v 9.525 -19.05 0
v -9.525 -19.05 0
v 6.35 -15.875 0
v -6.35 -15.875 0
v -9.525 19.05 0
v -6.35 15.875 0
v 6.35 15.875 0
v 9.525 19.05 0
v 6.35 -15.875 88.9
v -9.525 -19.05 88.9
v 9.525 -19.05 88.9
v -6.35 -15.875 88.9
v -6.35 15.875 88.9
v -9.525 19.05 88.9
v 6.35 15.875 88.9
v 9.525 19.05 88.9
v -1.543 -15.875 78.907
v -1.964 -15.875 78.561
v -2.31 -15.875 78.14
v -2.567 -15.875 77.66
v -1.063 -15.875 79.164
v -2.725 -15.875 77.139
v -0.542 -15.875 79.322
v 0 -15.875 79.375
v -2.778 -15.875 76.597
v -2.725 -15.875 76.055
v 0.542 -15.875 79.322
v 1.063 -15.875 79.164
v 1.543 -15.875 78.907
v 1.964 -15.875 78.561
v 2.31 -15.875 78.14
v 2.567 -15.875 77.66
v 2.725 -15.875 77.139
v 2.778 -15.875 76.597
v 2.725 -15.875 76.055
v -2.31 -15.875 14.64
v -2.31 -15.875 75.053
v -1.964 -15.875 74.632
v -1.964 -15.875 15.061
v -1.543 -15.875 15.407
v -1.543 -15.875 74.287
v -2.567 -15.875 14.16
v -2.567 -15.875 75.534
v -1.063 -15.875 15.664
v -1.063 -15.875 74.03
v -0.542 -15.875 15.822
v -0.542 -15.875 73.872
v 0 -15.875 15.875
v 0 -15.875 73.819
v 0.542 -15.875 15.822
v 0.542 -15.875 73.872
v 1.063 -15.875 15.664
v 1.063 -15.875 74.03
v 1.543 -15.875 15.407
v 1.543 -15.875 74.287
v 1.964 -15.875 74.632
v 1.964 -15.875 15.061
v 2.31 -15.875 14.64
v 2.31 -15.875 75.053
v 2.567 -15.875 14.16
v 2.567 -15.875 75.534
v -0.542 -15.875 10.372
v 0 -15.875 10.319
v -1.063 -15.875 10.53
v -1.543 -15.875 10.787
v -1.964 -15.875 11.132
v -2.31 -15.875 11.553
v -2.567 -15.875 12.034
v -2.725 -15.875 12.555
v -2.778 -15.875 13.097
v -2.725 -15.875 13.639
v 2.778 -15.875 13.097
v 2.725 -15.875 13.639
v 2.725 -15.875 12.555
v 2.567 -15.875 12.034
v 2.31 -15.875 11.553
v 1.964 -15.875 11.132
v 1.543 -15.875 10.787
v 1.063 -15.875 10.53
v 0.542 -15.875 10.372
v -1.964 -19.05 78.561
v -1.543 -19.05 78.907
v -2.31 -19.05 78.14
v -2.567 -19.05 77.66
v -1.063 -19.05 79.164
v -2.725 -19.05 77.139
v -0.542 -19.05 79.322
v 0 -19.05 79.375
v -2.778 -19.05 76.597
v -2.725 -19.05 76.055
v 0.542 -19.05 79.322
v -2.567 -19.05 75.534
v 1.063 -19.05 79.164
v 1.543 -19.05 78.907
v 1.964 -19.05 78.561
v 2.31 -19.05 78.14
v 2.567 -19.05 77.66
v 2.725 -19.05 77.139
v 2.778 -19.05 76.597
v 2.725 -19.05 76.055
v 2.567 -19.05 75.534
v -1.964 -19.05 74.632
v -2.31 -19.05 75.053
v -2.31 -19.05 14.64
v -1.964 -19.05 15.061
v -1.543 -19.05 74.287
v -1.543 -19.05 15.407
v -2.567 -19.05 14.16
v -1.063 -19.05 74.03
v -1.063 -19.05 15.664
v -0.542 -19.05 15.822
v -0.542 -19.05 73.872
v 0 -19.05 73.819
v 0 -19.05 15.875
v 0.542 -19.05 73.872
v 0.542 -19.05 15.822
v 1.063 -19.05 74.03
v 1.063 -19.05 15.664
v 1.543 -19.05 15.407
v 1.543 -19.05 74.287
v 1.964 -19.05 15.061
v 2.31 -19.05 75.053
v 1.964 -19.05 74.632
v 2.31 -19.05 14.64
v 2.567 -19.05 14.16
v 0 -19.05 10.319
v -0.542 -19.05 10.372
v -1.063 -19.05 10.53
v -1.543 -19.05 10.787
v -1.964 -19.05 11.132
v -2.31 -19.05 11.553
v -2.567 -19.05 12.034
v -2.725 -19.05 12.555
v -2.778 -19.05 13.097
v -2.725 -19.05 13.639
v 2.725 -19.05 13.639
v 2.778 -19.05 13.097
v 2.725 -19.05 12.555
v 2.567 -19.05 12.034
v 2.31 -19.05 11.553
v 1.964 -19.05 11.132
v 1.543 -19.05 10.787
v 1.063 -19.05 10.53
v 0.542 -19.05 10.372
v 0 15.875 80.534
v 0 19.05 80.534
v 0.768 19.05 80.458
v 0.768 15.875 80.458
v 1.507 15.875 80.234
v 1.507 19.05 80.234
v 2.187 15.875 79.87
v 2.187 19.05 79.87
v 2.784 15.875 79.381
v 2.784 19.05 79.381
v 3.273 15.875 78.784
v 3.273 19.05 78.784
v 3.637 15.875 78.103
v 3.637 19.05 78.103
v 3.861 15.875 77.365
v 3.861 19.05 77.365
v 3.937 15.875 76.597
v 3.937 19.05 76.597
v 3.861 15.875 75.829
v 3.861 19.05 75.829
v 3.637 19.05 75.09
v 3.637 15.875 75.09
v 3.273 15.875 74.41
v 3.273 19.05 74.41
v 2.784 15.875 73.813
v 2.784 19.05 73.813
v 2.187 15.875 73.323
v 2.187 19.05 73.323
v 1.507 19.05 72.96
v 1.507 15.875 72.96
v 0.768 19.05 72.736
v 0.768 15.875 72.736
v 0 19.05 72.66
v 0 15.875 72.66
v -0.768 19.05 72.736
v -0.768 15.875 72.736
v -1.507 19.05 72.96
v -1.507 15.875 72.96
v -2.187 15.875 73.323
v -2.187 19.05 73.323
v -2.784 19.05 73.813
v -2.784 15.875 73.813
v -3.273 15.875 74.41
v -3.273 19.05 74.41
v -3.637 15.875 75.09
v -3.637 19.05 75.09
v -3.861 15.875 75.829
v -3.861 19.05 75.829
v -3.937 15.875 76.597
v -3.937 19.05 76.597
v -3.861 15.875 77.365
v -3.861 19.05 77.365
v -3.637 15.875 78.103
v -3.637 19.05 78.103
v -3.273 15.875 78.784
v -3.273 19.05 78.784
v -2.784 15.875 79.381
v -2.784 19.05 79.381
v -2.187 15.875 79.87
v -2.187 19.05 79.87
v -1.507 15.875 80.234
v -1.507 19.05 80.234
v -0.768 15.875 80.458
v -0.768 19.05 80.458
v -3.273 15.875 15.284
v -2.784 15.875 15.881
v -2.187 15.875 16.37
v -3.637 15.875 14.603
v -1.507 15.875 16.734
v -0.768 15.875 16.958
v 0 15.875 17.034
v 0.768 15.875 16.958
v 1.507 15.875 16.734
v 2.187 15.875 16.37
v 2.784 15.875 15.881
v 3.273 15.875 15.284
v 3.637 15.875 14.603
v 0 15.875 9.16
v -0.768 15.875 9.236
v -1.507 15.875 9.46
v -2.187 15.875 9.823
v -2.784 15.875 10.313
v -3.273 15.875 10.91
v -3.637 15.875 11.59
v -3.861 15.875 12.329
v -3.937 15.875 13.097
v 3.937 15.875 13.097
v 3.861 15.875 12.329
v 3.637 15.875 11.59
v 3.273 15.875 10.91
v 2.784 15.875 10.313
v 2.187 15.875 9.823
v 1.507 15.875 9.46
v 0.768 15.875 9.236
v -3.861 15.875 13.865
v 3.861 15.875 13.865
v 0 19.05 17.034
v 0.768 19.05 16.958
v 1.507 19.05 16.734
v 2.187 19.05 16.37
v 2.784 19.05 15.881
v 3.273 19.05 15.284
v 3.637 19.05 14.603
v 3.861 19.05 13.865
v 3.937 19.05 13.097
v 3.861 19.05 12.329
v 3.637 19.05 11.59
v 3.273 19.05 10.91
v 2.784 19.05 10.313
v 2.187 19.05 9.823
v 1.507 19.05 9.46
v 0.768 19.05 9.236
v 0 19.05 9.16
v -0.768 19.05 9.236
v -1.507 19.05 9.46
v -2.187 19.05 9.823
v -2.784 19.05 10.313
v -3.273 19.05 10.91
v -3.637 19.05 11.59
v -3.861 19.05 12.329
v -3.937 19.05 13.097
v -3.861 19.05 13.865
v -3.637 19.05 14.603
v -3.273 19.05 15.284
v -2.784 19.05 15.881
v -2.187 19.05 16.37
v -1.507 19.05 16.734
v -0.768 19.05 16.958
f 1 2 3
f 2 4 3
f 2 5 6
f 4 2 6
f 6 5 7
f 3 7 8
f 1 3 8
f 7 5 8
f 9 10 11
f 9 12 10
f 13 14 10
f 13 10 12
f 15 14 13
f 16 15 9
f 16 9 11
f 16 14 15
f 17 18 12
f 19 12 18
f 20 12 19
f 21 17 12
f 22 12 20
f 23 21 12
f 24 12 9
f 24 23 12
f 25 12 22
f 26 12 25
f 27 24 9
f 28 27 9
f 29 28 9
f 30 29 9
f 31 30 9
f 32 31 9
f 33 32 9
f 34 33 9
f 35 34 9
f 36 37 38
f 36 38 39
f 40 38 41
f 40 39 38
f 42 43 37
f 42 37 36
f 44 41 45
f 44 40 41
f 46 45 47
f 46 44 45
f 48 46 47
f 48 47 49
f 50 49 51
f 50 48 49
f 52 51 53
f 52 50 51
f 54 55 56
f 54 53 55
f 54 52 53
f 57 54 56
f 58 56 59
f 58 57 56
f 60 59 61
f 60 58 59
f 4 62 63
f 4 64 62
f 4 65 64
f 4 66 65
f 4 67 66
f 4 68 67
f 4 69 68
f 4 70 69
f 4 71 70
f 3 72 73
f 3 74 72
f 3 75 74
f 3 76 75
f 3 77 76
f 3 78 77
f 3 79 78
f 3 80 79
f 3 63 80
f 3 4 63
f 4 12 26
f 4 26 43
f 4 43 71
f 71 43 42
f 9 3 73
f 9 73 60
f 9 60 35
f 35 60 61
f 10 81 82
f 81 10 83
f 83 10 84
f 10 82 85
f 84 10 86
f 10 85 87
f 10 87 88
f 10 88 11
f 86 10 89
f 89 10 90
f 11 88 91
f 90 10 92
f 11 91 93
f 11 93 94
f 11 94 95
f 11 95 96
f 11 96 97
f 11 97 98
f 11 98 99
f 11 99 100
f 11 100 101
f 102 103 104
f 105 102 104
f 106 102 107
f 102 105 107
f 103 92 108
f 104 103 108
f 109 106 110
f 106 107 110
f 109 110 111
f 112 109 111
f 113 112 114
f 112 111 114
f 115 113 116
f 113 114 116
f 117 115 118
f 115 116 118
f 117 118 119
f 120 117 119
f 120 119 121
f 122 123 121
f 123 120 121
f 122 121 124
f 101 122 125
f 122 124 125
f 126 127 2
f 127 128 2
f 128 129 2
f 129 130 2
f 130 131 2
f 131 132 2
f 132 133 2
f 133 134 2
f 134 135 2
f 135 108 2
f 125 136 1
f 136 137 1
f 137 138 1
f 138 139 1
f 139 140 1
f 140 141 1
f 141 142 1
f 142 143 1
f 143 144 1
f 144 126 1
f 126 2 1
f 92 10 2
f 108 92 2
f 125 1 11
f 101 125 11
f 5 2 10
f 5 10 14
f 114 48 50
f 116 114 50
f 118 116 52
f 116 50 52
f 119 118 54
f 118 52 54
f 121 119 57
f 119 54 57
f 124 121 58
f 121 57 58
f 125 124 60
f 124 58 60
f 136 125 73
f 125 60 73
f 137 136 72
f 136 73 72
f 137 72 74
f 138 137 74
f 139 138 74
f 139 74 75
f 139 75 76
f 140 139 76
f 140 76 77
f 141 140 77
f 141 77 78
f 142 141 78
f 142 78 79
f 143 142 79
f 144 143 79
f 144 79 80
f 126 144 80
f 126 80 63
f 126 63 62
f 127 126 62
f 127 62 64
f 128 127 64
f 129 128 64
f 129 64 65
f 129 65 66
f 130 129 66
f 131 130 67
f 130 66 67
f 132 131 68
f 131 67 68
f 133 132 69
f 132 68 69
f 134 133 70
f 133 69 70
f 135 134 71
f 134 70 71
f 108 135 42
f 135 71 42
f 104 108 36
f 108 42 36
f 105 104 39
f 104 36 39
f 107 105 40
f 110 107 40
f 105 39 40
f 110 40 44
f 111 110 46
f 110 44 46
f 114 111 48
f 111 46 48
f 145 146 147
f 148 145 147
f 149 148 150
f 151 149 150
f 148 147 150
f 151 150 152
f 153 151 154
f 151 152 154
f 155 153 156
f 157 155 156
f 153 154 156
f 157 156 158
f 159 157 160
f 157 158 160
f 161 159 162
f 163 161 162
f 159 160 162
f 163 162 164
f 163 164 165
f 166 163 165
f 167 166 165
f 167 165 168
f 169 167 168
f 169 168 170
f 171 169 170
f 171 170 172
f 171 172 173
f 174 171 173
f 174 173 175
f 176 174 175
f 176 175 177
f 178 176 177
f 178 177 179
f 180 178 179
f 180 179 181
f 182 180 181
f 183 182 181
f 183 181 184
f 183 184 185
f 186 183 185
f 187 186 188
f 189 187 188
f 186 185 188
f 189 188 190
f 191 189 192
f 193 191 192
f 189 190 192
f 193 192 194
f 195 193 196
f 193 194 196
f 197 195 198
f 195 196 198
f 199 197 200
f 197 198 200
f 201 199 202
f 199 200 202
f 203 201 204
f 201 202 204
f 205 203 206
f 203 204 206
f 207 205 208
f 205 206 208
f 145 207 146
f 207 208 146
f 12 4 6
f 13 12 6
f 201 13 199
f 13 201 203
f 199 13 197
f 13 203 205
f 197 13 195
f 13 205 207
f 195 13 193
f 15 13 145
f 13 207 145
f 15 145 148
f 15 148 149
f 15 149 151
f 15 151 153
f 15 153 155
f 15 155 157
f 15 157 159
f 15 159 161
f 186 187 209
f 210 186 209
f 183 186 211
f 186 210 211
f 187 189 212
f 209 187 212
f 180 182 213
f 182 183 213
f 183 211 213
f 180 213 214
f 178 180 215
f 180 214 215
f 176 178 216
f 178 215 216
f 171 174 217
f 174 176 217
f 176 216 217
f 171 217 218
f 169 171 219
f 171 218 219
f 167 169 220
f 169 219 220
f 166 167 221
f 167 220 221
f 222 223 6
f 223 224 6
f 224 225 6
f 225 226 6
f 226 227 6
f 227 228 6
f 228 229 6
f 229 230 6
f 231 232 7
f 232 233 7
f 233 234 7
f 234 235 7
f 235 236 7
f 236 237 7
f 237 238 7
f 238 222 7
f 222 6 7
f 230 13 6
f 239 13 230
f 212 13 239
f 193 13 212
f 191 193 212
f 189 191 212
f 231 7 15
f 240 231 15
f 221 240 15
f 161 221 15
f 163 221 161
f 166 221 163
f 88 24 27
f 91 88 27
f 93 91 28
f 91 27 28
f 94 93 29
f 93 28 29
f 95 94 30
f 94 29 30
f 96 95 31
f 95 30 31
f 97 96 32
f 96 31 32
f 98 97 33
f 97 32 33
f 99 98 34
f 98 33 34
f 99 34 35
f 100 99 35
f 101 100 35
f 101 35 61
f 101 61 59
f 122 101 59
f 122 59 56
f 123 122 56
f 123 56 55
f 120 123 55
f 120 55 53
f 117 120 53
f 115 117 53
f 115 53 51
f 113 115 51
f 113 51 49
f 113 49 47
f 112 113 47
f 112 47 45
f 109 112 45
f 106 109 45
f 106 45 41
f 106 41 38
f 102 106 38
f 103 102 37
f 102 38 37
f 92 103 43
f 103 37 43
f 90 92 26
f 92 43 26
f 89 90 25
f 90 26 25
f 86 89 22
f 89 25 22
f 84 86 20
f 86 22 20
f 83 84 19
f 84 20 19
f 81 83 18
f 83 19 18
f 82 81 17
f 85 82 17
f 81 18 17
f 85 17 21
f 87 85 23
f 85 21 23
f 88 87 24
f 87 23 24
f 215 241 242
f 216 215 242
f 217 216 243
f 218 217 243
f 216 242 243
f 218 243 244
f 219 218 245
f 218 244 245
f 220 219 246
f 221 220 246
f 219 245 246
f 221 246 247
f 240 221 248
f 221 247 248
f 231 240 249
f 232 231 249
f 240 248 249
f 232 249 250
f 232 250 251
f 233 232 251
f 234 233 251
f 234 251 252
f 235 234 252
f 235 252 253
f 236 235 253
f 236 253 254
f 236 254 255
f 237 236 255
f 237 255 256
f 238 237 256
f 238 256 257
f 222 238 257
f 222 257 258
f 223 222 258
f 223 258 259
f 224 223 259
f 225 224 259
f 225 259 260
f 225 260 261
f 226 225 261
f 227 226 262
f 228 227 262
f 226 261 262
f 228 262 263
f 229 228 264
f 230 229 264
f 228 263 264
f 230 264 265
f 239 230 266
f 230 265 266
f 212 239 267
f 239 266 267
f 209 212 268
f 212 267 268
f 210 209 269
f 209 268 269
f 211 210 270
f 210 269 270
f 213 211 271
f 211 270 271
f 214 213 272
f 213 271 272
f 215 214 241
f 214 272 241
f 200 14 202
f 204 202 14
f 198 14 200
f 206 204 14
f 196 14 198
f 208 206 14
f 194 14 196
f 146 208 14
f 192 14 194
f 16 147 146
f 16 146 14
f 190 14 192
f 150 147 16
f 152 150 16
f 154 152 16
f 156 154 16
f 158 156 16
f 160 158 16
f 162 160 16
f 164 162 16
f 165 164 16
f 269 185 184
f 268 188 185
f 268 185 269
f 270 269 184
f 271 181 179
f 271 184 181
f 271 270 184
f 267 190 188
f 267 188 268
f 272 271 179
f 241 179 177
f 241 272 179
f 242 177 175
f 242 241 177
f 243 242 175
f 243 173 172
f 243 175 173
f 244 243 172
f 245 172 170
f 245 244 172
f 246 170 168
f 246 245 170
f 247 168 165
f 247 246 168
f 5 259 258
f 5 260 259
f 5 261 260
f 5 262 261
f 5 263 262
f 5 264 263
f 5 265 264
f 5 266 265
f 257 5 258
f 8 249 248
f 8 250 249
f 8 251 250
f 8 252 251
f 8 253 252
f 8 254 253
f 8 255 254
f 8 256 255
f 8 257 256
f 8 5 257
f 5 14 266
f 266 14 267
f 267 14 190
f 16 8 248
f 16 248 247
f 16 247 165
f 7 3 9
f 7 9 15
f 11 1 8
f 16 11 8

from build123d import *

# Parameters (mm, degrees)
SKETCH1_W           = 19.05
SKETCH1_H           = 38.1
SKETCH1_W_2         = 12.7
SKETCH1_H_2         = 31.75
BOSS_EXTRUDE1_DEPTH = 88.9
SKETCH2_R           = 2.778125
CUT_EXTRUDE1_DEPTH  = 98.188196943
CUT_EXTRUDE2_REACH  = 99.188
SKETCH3_R           = 3.937


with BuildPart() as part:
    # Sketch1 → Boss-Extrude1 (new body)
    with BuildSketch(Plane.XY):
        Rectangle(SKETCH1_W, SKETCH1_H)
        Rectangle(SKETCH1_W_2, SKETCH1_H_2, mode=Mode.SUBTRACT)
    extrude(amount=BOSS_EXTRUDE1_DEPTH)

    # Sketch2 → Cut-Extrude1 (cut, through all)
    with BuildSketch(Plane(origin=(0, 19.05, 0), x_dir=(1, 0, 0), z_dir=(0, 1, 0))):
        with Locations(Location((0, -76.596875, 0), (0, 0, 270))):
            Circle(SKETCH2_R)
        with Locations(Location((0, -13.096875, 0), (0, 0, 270))):
            Circle(SKETCH2_R)
    extrude(amount=-CUT_EXTRUDE1_DEPTH, mode=Mode.SUBTRACT)

    # Sketch3 → Cut-Extrude2 (cut, up to next)
    with BuildSketch(Plane(origin=(0, 19.05, 0), x_dir=(1, 0, 0), z_dir=(0, 1, 0)), mode=Mode.PRIVATE) as cut_extrude2_sk1:
        with Locations(Location((0, -76.596875, 0), (0, 0, 270))):
            Circle(SKETCH3_R)
    cut_extrude2_tool1 = extrude(cut_extrude2_sk1.sketch, amount=-CUT_EXTRUDE2_REACH, mode=Mode.PRIVATE) & part.part
    # Sketch3 → Cut-Extrude2 (cut, up to next)
    with BuildSketch(Plane(origin=(0, 19.05, 0), x_dir=(1, 0, 0), z_dir=(0, 1, 0)), mode=Mode.PRIVATE) as cut_extrude2_sk2:
        with Locations(Location((0, -13.096875, 0), (0, 0, 270))):
            Circle(SKETCH3_R)
    cut_extrude2_tool2 = extrude(cut_extrude2_sk2.sketch, amount=-CUT_EXTRUDE2_REACH, mode=Mode.PRIVATE) & part.part
    add(cut_extrude2_tool1.solids().sort_by_distance((0, 19.05, 76.596875))[0], mode=Mode.SUBTRACT)
    add(cut_extrude2_tool2.solids().sort_by_distance((0, 19.05, 13.096875))[0], mode=Mode.SUBTRACT)


solid = part.part
